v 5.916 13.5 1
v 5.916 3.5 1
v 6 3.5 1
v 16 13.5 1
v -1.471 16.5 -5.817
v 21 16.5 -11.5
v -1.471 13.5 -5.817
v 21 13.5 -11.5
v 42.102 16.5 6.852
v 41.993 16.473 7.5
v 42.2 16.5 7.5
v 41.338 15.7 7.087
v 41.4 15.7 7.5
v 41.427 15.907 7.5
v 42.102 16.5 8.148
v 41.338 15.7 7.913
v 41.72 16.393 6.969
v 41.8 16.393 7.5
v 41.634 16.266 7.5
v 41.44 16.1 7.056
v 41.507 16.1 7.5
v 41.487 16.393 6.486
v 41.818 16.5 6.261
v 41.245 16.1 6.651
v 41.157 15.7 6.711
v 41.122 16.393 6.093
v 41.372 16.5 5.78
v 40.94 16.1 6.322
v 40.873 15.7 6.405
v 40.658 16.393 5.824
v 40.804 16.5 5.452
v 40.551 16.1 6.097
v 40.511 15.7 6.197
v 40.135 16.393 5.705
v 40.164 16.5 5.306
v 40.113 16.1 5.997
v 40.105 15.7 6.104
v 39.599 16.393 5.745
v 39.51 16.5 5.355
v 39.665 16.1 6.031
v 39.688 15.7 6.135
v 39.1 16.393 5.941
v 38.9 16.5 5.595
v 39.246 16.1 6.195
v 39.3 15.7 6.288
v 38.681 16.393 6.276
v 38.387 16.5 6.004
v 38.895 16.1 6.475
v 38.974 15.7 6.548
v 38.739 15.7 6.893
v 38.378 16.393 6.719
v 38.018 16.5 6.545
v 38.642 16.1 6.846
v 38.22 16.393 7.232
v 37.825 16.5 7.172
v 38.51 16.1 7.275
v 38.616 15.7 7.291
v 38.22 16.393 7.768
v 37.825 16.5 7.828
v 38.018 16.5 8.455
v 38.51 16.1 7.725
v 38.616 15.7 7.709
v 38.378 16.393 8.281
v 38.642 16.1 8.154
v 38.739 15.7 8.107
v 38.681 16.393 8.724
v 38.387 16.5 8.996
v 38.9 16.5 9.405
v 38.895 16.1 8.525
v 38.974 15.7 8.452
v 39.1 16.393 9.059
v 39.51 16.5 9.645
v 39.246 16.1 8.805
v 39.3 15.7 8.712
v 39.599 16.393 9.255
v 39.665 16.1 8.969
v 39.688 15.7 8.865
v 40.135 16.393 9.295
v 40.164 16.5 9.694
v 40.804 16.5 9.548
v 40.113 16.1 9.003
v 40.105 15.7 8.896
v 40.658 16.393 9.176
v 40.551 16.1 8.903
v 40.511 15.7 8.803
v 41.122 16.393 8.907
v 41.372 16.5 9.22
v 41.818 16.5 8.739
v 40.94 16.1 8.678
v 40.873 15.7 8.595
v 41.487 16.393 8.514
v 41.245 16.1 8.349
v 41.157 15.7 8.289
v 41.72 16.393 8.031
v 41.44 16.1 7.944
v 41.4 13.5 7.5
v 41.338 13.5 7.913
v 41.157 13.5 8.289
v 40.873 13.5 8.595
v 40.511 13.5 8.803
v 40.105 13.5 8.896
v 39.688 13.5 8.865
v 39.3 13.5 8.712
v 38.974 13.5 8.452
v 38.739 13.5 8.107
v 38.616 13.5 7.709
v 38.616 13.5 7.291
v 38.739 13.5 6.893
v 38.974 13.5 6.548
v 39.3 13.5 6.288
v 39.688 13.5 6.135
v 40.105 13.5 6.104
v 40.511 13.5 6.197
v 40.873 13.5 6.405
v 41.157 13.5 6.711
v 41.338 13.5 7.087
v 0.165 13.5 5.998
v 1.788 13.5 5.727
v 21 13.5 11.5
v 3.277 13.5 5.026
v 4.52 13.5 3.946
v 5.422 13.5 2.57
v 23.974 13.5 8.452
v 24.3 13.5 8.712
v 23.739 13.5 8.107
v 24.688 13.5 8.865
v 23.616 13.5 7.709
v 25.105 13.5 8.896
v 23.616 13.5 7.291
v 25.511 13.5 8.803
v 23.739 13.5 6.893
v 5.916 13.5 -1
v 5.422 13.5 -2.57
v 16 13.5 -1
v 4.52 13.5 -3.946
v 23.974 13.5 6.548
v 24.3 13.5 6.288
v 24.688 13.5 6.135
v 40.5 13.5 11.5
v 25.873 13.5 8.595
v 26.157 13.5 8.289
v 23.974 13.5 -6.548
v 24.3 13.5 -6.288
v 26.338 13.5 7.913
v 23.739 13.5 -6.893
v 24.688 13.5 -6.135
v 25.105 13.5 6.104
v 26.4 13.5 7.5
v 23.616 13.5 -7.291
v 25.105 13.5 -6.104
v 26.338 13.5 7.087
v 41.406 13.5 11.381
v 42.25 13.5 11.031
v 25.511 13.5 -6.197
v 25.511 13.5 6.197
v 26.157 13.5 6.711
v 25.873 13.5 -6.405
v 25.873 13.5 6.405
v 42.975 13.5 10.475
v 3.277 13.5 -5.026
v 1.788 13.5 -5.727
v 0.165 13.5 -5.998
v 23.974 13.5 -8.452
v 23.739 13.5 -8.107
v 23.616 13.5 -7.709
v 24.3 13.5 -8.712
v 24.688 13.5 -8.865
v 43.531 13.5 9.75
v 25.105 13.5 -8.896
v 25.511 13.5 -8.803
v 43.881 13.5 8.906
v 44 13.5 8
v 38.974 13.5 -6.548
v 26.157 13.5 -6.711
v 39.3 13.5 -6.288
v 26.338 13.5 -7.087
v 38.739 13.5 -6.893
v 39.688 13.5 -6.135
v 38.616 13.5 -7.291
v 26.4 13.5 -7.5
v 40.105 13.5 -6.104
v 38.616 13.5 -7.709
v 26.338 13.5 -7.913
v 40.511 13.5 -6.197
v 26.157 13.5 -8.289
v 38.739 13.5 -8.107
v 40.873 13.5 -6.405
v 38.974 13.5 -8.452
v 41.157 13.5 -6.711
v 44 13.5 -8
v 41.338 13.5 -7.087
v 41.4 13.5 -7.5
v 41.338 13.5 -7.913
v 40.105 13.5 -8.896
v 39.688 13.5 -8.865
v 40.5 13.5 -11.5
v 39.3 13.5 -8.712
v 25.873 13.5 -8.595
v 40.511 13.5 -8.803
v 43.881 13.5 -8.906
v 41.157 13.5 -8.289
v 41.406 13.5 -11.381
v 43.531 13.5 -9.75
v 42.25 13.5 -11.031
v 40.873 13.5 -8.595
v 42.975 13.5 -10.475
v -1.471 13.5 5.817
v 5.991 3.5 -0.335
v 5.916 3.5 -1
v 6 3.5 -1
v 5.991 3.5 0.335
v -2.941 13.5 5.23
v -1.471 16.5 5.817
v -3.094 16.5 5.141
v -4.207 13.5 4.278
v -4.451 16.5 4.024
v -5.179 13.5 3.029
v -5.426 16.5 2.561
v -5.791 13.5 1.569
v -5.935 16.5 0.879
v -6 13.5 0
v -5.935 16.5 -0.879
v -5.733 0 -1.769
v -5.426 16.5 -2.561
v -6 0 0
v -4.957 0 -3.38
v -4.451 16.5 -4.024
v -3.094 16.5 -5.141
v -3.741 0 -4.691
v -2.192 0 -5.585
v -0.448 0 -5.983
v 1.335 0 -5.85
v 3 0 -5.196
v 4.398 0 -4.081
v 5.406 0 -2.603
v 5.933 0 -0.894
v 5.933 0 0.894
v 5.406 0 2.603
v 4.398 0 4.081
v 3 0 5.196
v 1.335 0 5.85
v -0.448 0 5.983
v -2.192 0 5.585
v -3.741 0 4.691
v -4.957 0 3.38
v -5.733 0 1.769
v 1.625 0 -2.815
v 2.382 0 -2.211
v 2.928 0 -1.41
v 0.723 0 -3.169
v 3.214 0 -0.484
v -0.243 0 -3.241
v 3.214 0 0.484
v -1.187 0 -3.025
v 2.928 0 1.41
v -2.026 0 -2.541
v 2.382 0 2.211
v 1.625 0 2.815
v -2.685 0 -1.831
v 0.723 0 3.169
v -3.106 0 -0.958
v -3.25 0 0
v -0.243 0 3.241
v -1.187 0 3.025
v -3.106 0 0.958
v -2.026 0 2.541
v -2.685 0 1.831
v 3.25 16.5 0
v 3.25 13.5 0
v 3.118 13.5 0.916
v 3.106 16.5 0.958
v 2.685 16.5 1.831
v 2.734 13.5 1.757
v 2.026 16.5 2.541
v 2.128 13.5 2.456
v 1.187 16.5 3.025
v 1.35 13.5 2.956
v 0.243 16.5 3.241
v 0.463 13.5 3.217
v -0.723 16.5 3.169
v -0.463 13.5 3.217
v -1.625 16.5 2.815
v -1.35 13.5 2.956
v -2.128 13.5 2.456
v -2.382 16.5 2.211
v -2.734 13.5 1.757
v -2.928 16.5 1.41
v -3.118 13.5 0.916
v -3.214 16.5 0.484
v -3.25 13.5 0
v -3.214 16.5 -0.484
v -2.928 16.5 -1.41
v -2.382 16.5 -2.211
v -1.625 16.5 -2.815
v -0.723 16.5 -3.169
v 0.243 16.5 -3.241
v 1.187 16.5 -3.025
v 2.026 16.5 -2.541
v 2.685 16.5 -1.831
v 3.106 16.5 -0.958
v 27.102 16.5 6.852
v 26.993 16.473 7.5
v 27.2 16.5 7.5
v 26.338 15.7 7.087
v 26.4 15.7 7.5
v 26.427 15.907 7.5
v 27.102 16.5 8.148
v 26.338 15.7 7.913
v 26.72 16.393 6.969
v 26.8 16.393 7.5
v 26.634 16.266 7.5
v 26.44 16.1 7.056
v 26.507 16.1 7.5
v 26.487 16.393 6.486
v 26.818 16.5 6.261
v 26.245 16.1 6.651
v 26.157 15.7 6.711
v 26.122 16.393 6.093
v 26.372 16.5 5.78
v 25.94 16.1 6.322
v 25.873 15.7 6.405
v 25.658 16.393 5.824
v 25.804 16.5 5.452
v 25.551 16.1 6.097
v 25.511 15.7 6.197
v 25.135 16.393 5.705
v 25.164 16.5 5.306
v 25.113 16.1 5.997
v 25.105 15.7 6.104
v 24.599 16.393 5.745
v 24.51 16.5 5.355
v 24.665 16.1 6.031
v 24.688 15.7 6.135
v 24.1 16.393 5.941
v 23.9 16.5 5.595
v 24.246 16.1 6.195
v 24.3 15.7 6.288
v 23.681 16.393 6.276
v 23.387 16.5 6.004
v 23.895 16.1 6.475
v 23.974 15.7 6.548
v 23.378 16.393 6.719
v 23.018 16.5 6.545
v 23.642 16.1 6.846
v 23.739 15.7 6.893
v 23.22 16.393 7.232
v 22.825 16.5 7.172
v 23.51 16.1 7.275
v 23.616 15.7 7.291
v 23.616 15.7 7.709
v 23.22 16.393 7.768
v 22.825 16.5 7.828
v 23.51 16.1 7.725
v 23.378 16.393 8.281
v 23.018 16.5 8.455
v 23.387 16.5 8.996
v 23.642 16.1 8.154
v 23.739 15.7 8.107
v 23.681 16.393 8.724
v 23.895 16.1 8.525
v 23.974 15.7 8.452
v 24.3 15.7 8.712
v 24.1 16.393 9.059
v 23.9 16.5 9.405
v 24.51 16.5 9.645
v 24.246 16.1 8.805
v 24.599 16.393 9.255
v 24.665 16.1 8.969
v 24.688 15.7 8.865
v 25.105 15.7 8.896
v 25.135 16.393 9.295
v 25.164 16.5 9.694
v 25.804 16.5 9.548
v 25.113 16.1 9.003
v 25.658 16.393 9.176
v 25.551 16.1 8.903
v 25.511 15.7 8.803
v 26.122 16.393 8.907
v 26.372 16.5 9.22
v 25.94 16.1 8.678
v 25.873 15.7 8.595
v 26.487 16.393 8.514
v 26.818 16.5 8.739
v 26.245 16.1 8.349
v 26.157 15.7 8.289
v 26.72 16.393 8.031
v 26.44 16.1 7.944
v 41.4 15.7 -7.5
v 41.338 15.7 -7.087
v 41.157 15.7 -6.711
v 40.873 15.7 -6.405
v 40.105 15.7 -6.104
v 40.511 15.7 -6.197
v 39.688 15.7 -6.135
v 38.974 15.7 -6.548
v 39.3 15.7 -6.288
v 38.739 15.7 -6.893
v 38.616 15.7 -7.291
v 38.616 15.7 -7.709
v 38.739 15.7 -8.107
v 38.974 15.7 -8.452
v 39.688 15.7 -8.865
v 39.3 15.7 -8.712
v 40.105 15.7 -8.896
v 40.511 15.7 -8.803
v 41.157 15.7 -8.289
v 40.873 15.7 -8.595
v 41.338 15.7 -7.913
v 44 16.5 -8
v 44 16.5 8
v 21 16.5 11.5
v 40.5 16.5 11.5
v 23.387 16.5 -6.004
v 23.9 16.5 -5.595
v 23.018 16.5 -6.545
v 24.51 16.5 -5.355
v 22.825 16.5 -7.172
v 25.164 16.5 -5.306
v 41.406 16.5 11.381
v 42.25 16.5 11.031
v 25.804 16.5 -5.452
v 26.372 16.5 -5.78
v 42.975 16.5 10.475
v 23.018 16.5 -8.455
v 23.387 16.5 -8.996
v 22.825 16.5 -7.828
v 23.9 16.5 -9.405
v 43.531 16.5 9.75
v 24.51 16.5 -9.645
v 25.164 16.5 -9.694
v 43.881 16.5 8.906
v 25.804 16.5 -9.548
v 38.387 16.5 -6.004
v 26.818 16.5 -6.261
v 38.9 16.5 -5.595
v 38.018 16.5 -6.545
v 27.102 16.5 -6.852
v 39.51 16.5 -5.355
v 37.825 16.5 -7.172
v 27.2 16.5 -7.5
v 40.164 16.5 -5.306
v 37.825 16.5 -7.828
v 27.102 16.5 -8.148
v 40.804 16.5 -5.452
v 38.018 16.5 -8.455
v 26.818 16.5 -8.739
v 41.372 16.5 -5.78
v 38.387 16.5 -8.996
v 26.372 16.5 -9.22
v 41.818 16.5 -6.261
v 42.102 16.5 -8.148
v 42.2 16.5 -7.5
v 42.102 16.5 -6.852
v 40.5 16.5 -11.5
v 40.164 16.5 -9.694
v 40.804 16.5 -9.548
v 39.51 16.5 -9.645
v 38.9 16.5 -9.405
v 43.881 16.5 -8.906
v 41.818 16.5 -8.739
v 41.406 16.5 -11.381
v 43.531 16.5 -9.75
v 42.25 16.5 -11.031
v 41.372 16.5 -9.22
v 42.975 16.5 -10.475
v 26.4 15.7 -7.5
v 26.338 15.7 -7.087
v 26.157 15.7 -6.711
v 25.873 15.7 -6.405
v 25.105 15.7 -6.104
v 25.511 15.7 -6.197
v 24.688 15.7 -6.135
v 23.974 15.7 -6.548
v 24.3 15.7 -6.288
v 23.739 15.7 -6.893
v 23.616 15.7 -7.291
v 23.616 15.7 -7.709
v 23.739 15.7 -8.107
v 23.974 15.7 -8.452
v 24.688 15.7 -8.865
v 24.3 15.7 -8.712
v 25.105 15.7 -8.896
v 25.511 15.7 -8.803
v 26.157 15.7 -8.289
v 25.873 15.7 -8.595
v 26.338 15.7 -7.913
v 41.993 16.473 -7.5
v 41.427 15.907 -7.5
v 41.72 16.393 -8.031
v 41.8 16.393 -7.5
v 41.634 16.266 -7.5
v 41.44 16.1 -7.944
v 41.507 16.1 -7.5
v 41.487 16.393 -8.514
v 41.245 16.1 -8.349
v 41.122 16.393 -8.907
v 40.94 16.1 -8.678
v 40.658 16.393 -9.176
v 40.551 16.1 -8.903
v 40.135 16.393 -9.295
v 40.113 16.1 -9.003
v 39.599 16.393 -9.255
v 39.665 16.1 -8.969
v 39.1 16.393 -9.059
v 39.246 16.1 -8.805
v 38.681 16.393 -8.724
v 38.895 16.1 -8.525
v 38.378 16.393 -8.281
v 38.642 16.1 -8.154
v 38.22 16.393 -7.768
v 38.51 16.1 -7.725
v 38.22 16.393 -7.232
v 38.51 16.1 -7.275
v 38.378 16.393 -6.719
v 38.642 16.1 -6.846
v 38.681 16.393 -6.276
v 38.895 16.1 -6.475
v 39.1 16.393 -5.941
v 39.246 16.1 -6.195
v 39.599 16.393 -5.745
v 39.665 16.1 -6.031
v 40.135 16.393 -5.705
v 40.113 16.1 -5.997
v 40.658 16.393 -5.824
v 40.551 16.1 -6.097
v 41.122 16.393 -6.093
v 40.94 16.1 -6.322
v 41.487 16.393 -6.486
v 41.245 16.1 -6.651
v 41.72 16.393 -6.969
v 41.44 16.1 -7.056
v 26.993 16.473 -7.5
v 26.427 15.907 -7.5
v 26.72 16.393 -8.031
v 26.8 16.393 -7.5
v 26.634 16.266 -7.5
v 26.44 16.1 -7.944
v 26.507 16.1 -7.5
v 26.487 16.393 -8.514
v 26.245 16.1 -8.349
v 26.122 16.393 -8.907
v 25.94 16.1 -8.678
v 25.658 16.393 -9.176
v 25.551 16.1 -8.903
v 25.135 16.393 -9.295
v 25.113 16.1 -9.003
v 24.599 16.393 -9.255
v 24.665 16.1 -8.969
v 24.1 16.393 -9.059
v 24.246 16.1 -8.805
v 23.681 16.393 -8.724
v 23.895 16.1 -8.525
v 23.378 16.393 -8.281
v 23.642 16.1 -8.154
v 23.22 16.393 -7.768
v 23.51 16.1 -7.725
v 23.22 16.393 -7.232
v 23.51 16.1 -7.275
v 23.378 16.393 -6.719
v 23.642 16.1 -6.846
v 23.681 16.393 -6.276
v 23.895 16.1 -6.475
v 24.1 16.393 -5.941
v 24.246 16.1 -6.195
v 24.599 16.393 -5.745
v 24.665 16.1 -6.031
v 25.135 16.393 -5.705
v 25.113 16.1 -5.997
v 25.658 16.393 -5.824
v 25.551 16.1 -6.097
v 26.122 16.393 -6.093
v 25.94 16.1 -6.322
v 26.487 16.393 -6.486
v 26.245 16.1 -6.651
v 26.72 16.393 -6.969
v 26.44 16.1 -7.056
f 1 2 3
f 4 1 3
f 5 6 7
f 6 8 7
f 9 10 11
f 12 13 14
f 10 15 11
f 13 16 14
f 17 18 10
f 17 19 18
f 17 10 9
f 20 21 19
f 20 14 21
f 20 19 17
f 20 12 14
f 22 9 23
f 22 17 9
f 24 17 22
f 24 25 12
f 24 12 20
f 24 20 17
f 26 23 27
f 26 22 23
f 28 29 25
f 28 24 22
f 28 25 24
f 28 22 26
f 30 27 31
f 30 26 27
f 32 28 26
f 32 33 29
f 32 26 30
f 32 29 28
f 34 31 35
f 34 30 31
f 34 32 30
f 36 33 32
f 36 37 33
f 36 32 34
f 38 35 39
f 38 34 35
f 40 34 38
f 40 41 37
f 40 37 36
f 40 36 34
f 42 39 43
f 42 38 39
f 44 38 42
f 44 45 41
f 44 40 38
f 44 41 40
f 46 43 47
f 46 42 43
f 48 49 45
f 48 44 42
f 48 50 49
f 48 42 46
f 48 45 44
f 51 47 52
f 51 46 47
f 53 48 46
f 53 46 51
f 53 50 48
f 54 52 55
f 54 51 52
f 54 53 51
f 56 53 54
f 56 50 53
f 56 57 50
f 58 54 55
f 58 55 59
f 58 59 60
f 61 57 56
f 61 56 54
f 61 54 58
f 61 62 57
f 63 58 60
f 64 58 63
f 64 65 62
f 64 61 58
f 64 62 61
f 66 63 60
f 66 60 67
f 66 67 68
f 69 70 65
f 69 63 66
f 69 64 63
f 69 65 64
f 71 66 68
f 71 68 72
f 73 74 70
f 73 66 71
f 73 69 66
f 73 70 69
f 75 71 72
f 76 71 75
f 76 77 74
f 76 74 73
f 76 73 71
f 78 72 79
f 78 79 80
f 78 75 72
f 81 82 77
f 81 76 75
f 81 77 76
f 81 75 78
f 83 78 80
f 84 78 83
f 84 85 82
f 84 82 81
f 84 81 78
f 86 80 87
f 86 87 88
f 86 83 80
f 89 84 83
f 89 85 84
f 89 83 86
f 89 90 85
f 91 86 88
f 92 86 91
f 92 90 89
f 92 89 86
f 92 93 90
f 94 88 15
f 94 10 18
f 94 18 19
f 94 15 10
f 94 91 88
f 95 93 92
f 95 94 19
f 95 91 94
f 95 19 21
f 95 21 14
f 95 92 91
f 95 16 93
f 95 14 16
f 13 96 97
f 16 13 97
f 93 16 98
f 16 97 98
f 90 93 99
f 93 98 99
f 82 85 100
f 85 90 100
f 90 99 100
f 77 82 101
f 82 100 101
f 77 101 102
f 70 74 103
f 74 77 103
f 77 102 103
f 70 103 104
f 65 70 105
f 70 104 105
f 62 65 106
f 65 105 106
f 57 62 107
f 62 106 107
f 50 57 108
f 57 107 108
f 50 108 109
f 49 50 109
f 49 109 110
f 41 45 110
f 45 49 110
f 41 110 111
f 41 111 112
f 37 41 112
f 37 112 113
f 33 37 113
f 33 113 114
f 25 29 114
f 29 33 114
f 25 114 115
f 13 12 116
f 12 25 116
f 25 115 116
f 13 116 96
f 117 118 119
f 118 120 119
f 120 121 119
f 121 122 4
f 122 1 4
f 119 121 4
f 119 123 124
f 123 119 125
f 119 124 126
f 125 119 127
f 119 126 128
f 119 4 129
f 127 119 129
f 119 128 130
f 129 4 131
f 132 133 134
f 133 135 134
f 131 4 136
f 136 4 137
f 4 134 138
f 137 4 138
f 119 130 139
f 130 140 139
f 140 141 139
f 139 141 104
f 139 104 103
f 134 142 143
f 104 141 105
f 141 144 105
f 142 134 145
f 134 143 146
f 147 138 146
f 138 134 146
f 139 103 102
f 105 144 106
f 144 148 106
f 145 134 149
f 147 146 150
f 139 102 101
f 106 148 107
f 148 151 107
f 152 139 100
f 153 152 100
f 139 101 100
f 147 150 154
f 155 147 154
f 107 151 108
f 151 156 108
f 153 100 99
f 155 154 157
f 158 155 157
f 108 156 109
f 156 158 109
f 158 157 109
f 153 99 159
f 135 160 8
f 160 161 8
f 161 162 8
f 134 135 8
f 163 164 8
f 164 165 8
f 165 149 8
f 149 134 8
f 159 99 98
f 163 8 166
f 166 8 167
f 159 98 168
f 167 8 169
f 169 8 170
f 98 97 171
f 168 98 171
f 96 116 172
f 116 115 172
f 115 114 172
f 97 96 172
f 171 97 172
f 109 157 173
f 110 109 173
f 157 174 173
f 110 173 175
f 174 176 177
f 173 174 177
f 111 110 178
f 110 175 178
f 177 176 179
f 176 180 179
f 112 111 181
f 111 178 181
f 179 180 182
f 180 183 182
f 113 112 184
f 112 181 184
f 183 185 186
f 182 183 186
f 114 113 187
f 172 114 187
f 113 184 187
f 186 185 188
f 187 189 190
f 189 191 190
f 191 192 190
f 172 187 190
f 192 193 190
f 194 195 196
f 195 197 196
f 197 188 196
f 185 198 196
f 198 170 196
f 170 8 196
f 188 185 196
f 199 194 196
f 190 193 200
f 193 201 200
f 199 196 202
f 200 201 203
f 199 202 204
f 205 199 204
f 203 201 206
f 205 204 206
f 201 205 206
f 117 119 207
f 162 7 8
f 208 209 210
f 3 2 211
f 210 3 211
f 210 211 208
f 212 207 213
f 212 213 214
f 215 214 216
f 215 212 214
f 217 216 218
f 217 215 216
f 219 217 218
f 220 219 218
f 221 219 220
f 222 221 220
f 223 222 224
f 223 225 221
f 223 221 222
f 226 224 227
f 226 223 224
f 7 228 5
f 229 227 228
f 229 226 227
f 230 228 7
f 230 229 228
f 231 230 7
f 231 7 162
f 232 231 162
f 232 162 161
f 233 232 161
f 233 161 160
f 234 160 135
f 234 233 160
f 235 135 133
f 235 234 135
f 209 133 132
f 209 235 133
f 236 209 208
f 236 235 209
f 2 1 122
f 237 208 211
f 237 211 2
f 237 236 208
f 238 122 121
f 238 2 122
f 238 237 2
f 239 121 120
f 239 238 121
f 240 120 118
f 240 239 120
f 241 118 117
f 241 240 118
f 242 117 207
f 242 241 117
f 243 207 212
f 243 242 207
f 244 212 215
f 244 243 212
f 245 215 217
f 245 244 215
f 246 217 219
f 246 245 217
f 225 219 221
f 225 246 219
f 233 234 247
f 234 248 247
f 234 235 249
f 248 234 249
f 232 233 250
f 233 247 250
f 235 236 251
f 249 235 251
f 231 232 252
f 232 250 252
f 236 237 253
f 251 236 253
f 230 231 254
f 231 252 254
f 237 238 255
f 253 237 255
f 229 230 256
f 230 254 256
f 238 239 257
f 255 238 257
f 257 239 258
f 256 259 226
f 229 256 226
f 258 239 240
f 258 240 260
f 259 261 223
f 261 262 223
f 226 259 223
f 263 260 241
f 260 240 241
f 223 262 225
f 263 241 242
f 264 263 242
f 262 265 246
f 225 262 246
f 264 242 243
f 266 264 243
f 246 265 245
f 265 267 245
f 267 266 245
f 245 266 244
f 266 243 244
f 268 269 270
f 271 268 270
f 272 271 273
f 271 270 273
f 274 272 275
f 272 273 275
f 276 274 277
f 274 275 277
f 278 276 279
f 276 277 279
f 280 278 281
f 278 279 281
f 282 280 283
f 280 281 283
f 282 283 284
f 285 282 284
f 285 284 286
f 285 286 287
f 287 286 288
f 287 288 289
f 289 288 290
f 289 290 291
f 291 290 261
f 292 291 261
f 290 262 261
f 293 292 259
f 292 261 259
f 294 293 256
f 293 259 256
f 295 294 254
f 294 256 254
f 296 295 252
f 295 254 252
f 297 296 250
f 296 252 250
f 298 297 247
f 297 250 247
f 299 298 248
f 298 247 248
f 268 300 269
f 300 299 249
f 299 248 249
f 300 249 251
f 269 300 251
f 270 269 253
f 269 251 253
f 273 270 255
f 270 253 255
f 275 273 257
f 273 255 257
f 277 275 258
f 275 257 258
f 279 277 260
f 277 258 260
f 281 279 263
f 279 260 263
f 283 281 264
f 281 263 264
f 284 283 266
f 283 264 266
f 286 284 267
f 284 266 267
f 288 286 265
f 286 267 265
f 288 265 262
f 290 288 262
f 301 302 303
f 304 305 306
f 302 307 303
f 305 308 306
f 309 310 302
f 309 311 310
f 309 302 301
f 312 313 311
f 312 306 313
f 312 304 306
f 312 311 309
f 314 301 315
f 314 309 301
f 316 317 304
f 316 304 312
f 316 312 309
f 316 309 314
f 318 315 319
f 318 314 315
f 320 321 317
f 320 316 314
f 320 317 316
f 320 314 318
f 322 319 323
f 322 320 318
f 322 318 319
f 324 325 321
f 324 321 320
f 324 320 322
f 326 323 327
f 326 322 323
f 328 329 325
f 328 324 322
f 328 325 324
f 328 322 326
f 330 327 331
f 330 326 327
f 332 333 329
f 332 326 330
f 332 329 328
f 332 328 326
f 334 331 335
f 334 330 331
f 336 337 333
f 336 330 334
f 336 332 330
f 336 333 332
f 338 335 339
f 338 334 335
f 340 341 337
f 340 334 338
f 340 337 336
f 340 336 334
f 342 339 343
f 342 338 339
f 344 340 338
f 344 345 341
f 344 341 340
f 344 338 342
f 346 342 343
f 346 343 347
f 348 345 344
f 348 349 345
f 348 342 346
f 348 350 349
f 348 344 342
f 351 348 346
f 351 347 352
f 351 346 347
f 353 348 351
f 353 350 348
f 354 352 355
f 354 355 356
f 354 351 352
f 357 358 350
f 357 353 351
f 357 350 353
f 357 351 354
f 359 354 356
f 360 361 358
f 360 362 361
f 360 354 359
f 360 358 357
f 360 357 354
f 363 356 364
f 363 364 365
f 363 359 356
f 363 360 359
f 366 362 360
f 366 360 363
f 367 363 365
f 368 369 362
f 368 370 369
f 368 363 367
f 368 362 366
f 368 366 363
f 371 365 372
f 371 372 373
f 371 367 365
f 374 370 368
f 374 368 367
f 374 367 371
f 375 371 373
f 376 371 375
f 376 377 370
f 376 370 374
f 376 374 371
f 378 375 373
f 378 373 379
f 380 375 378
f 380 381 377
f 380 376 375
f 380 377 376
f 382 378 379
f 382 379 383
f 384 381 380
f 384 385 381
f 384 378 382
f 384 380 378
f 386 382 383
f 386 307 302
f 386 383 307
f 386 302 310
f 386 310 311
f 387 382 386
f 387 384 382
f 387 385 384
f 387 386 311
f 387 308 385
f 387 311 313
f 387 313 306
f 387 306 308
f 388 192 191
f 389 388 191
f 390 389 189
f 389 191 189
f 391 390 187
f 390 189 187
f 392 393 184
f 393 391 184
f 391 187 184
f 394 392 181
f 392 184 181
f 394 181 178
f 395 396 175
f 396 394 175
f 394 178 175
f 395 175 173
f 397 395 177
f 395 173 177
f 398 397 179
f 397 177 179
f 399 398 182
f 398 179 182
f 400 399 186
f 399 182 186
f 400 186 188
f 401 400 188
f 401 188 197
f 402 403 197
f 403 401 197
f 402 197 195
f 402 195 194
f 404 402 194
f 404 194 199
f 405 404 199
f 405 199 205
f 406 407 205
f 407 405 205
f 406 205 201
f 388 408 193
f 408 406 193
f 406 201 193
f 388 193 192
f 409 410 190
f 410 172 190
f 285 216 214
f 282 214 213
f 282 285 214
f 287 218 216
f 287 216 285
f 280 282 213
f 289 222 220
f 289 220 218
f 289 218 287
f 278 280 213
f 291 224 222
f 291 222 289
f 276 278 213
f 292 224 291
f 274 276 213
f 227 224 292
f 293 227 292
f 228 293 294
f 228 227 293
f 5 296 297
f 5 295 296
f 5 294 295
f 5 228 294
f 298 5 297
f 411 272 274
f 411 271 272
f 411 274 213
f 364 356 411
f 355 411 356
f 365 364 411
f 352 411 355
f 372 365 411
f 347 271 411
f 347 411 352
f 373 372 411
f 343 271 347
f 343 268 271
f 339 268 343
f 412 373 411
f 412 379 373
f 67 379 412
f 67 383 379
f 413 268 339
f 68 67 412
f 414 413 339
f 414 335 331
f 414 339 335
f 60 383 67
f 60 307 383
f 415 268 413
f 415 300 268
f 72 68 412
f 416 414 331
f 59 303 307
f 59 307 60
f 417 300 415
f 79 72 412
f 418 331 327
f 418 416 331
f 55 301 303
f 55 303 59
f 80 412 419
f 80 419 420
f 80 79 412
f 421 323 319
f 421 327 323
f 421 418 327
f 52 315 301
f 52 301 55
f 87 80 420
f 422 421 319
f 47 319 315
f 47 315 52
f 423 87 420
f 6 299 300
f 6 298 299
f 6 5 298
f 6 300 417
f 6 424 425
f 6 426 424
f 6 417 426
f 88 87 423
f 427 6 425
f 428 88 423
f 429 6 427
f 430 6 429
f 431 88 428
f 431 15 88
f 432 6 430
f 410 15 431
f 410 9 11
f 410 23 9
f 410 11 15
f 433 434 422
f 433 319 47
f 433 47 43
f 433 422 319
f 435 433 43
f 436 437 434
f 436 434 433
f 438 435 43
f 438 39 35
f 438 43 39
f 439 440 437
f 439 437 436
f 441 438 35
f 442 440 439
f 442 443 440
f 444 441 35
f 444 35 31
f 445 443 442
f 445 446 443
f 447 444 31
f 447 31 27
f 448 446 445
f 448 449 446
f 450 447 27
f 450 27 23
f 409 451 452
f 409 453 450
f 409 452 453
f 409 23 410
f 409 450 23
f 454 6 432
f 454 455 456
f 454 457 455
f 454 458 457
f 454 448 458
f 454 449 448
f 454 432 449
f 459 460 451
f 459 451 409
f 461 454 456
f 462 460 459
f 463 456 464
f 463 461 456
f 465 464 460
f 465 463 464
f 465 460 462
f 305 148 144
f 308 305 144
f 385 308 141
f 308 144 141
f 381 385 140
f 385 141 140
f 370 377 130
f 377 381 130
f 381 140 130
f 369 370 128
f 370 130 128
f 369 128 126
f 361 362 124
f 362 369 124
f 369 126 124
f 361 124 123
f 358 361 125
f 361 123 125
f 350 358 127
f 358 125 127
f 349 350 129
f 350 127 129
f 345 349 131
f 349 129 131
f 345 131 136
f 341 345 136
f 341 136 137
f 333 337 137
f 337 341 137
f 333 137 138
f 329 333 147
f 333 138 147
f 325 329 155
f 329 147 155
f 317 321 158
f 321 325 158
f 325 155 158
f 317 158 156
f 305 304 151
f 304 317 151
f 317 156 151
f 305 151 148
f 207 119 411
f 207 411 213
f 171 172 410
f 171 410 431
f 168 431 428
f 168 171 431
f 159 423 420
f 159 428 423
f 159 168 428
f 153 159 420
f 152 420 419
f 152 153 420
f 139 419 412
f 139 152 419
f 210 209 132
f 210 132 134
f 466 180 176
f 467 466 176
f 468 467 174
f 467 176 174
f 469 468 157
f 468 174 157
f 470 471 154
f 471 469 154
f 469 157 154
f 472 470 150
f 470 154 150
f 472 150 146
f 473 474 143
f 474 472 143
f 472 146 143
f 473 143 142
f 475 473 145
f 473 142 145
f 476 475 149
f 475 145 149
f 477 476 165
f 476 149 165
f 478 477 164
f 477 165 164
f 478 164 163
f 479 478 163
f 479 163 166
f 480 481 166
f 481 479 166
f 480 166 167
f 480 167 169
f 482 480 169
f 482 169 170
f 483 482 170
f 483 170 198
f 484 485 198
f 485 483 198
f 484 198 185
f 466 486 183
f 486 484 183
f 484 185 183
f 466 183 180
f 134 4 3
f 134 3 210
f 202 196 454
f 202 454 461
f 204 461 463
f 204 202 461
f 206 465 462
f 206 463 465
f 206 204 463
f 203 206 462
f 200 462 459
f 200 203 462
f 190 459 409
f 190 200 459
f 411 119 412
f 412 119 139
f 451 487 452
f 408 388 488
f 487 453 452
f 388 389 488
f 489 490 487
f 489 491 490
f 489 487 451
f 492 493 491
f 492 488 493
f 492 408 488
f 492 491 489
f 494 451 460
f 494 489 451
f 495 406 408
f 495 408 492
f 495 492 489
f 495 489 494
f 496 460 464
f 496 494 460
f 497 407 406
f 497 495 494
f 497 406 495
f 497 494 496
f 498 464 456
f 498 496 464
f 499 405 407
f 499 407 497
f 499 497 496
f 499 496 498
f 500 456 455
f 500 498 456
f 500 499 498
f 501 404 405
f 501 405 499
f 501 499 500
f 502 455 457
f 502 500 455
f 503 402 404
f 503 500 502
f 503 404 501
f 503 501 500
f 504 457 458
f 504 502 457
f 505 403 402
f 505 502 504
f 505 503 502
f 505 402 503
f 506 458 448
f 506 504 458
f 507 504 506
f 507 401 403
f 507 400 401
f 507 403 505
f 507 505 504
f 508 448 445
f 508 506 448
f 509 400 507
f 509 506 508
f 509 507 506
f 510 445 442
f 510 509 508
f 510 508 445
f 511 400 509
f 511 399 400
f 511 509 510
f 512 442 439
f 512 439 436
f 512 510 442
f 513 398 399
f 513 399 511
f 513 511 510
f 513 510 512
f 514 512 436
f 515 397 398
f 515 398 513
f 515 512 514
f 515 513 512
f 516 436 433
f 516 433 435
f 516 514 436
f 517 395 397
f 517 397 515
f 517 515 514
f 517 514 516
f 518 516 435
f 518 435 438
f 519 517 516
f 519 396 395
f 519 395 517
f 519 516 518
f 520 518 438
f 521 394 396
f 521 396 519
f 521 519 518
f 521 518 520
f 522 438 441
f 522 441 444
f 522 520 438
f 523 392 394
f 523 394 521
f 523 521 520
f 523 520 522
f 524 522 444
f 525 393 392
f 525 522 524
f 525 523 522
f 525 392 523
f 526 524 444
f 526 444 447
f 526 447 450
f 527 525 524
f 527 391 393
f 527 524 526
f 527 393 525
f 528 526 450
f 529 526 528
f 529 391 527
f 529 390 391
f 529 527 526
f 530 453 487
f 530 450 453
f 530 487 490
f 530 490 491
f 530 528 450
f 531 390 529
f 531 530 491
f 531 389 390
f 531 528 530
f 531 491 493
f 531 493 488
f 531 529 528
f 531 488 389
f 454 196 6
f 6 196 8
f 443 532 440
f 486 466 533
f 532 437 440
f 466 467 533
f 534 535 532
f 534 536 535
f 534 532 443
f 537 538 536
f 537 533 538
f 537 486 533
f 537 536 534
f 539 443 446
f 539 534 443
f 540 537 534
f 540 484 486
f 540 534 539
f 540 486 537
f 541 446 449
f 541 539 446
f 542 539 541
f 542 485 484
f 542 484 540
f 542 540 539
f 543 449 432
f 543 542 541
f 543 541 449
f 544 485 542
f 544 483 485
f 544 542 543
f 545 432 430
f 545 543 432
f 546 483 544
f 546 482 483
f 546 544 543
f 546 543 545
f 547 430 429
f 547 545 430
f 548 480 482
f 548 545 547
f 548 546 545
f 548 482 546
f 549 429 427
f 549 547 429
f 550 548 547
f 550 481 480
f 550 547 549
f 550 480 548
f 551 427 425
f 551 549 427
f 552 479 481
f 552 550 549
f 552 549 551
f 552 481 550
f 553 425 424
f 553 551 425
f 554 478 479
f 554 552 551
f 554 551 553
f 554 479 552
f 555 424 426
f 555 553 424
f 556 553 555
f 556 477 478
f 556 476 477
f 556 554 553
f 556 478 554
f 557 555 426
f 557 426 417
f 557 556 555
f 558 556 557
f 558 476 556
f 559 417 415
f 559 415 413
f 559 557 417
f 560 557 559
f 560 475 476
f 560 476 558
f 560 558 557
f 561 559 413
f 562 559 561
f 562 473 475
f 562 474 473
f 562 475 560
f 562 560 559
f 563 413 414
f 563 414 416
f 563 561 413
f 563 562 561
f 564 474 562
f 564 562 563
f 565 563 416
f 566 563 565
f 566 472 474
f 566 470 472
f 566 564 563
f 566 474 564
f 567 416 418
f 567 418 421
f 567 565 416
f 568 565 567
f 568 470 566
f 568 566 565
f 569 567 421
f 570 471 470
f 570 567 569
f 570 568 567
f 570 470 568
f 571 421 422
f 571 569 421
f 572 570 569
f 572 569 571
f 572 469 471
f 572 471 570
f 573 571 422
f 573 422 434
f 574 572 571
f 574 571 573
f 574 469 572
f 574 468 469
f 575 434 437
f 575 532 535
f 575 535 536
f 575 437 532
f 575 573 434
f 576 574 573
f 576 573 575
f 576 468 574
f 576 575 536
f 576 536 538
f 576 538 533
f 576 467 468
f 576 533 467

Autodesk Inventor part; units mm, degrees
ref_plane "YZ Plane" through (0, 0, 0) normal (1, 0, 0) x (0, 1, 0)
ref_plane "XZ Plane" through (0, 0, 0) normal (0, 1, 0) x (-1, 0, 0)
ref_plane "XY Plane" through (0, 0, 0) normal (0, 0, 1) x (1, 0, 0)
sketch "Sketch1" plane through (0, 0, 0) normal (0, 1, 0) x (-1, 0, 0)
  circle A0 centre (0, 0) radius 3.25
  circle A1 centre (0, 0) radius 6
  dimension "d0" = 6.5
  dimension "d1" = 12
extrude "Extrusion1" add sketch "Sketch1" along normal blind 13.5
sketch "Sketch2" plane through (0, 13.5, 0) normal (0, 1, 0) x (1, 0, 0)
  line L0 (0, 0) -> (25, 0) construction
  line L1 (25, 7.5) -> (40, 7.5) construction
  line L2 (40, 7.5) -> (40, -7.5) construction
  line L3 (40, -7.5) -> (25, -7.5) construction
  line L4 (25, -7.5) -> (25, 7.5) construction
  circle A0 centre (25, 7.5) radius 1.4
  circle A1 centre (40, 7.5) radius 1.4
  circle A2 centre (40, -7.5) radius 1.4
  circle A3 centre (25, -7.5) radius 1.4
  circle A4 centre (0, 0) radius 6.3 construction
  line L5 (40.5, 11.5) -> (21, 11.5)
  line L6 (21, -11.5) -> (40.5, -11.5)
  line L7 (44, -8) -> (44, 8)
  line L8 (21, 11.5) -> (-1.4711, 5.8169)
  line L9 (21, -11.5) -> (-1.4711, -5.8169)
  circle A5 centre (0, 0) radius 6 projected
  circle A6 centre (0, 0) radius 3.25 projected
  arc A7 (44, 8) -> (40.5, 11.5) centre (40.5, 8) ccw
  arc A8 (40.5, -11.5) -> (44, -8) centre (40.5, -8) ccw
  dimension "d4" = 25
  dimension "d5" = 15
  dimension "d6" = 15
  dimension "d7" = 7.5
  dimension "d8" = 2.8
  dimension "d9" = 2.8
  dimension "d10" = 2.8
  dimension "d11" = 2.8
  dimension "d12" = 12.6
  dimension "d13" = 4
  dimension "d14" = 3.5
extrude "Extrusion2" add sketch "Sketch2" along normal blind 3
fillet "Fillet1" radius 0.8 4 edges at (23.6, 16.5, 7.5) (23.6, 16.5, -7.5) (38.6, 16.5, -7.5) (38.6, 16.5, 7.5)
sketch "Sketch3" plane through (0, 13.5, 0) normal (0, -1, 0) x (1, 0, 0)
  circle A0 centre (0, 0) radius 6 projected
  line L0 (5.9161, 1) -> (16, 1)
  line L1 (5.9161, -1) -> (16, -1)
  line L2 (16, 1) -> (16, -1)
  dimension "d18" = 1
  dimension "d19" = 1
  dimension "d20" = 10
extrude "Extrusion3" add sketch "Sketch3" along normal blind 10 contours A0 L0 L2 L1
chamfer "Chamfer1" distance 10 angle 45 1 edges at (16, 3.5, 0)
equation "\"d7\" = 0.5 * d6"
equation "\"d9\" = d8"
equation "\"d10\" = d8"
equation "\"d11\" = d8"
properties part number "WM 720p USB Webcam Endefector Mount"
